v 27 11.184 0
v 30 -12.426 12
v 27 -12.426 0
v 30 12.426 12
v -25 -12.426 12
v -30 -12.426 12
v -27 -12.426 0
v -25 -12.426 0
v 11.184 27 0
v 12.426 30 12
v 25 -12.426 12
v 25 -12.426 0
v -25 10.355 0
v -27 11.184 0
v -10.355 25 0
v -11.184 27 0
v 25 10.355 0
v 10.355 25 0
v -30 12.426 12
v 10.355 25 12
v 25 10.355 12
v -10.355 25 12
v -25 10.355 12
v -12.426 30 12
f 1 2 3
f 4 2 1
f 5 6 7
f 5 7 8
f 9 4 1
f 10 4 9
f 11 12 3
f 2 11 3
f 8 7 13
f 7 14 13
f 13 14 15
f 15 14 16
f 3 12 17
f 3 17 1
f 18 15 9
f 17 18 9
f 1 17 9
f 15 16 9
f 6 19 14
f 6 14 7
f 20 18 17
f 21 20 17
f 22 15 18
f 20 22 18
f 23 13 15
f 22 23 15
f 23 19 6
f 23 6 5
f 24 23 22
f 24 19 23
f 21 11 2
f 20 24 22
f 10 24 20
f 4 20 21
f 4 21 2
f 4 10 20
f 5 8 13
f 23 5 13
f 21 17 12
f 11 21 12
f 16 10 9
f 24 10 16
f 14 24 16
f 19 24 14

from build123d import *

# Parameters (mm, degrees)
F1_DEPTH = 12
F2_SIZE2 = 11.99999
F2_SIZE  = 2.99999


# Not quite as in the source:
# - a fillet or chamfer is up to 0.001 mm smaller than in the source, because OpenCascade refuses the exact size


with BuildPart() as f1:
    # F0 (on Top) → F1 (new body)
    with BuildSketch(Plane.XY):
        Polygon((12.4264068712, 30), (-12.4264068712, 30), (-30, 12.4264068712), (-30, -12.4264068712), (-25, -12.4264068712), (-25, 10.3553390593), (-10.3553390593, 25), (10.3553390593, 25), (25, 10.3553390593), (25, -12.4264068712), (30, -12.4264068712), (30, 12.4264068712), align=None)
    extrude(amount=F1_DEPTH)

    # F2 (size 3 and 12 in the source; OpenCascade refuses exactly that, so slightly less here)
    f2_edges = [f1.edges().sort_by_distance(p)[0] for p in [
        (-30, 0, 0),
        (-21.213203, 21.213203, 0),
        (0, 30, 0),
        (21.213203, 21.213203, 0),
        (30, 0, 0),
    ]]
    f2_side = f1.faces().sort_by_distance((0, 29.265153, 0))[0]
    chamfer(f2_edges, length=F2_SIZE, length2=F2_SIZE2, reference=f2_side)


solid = f1.part
